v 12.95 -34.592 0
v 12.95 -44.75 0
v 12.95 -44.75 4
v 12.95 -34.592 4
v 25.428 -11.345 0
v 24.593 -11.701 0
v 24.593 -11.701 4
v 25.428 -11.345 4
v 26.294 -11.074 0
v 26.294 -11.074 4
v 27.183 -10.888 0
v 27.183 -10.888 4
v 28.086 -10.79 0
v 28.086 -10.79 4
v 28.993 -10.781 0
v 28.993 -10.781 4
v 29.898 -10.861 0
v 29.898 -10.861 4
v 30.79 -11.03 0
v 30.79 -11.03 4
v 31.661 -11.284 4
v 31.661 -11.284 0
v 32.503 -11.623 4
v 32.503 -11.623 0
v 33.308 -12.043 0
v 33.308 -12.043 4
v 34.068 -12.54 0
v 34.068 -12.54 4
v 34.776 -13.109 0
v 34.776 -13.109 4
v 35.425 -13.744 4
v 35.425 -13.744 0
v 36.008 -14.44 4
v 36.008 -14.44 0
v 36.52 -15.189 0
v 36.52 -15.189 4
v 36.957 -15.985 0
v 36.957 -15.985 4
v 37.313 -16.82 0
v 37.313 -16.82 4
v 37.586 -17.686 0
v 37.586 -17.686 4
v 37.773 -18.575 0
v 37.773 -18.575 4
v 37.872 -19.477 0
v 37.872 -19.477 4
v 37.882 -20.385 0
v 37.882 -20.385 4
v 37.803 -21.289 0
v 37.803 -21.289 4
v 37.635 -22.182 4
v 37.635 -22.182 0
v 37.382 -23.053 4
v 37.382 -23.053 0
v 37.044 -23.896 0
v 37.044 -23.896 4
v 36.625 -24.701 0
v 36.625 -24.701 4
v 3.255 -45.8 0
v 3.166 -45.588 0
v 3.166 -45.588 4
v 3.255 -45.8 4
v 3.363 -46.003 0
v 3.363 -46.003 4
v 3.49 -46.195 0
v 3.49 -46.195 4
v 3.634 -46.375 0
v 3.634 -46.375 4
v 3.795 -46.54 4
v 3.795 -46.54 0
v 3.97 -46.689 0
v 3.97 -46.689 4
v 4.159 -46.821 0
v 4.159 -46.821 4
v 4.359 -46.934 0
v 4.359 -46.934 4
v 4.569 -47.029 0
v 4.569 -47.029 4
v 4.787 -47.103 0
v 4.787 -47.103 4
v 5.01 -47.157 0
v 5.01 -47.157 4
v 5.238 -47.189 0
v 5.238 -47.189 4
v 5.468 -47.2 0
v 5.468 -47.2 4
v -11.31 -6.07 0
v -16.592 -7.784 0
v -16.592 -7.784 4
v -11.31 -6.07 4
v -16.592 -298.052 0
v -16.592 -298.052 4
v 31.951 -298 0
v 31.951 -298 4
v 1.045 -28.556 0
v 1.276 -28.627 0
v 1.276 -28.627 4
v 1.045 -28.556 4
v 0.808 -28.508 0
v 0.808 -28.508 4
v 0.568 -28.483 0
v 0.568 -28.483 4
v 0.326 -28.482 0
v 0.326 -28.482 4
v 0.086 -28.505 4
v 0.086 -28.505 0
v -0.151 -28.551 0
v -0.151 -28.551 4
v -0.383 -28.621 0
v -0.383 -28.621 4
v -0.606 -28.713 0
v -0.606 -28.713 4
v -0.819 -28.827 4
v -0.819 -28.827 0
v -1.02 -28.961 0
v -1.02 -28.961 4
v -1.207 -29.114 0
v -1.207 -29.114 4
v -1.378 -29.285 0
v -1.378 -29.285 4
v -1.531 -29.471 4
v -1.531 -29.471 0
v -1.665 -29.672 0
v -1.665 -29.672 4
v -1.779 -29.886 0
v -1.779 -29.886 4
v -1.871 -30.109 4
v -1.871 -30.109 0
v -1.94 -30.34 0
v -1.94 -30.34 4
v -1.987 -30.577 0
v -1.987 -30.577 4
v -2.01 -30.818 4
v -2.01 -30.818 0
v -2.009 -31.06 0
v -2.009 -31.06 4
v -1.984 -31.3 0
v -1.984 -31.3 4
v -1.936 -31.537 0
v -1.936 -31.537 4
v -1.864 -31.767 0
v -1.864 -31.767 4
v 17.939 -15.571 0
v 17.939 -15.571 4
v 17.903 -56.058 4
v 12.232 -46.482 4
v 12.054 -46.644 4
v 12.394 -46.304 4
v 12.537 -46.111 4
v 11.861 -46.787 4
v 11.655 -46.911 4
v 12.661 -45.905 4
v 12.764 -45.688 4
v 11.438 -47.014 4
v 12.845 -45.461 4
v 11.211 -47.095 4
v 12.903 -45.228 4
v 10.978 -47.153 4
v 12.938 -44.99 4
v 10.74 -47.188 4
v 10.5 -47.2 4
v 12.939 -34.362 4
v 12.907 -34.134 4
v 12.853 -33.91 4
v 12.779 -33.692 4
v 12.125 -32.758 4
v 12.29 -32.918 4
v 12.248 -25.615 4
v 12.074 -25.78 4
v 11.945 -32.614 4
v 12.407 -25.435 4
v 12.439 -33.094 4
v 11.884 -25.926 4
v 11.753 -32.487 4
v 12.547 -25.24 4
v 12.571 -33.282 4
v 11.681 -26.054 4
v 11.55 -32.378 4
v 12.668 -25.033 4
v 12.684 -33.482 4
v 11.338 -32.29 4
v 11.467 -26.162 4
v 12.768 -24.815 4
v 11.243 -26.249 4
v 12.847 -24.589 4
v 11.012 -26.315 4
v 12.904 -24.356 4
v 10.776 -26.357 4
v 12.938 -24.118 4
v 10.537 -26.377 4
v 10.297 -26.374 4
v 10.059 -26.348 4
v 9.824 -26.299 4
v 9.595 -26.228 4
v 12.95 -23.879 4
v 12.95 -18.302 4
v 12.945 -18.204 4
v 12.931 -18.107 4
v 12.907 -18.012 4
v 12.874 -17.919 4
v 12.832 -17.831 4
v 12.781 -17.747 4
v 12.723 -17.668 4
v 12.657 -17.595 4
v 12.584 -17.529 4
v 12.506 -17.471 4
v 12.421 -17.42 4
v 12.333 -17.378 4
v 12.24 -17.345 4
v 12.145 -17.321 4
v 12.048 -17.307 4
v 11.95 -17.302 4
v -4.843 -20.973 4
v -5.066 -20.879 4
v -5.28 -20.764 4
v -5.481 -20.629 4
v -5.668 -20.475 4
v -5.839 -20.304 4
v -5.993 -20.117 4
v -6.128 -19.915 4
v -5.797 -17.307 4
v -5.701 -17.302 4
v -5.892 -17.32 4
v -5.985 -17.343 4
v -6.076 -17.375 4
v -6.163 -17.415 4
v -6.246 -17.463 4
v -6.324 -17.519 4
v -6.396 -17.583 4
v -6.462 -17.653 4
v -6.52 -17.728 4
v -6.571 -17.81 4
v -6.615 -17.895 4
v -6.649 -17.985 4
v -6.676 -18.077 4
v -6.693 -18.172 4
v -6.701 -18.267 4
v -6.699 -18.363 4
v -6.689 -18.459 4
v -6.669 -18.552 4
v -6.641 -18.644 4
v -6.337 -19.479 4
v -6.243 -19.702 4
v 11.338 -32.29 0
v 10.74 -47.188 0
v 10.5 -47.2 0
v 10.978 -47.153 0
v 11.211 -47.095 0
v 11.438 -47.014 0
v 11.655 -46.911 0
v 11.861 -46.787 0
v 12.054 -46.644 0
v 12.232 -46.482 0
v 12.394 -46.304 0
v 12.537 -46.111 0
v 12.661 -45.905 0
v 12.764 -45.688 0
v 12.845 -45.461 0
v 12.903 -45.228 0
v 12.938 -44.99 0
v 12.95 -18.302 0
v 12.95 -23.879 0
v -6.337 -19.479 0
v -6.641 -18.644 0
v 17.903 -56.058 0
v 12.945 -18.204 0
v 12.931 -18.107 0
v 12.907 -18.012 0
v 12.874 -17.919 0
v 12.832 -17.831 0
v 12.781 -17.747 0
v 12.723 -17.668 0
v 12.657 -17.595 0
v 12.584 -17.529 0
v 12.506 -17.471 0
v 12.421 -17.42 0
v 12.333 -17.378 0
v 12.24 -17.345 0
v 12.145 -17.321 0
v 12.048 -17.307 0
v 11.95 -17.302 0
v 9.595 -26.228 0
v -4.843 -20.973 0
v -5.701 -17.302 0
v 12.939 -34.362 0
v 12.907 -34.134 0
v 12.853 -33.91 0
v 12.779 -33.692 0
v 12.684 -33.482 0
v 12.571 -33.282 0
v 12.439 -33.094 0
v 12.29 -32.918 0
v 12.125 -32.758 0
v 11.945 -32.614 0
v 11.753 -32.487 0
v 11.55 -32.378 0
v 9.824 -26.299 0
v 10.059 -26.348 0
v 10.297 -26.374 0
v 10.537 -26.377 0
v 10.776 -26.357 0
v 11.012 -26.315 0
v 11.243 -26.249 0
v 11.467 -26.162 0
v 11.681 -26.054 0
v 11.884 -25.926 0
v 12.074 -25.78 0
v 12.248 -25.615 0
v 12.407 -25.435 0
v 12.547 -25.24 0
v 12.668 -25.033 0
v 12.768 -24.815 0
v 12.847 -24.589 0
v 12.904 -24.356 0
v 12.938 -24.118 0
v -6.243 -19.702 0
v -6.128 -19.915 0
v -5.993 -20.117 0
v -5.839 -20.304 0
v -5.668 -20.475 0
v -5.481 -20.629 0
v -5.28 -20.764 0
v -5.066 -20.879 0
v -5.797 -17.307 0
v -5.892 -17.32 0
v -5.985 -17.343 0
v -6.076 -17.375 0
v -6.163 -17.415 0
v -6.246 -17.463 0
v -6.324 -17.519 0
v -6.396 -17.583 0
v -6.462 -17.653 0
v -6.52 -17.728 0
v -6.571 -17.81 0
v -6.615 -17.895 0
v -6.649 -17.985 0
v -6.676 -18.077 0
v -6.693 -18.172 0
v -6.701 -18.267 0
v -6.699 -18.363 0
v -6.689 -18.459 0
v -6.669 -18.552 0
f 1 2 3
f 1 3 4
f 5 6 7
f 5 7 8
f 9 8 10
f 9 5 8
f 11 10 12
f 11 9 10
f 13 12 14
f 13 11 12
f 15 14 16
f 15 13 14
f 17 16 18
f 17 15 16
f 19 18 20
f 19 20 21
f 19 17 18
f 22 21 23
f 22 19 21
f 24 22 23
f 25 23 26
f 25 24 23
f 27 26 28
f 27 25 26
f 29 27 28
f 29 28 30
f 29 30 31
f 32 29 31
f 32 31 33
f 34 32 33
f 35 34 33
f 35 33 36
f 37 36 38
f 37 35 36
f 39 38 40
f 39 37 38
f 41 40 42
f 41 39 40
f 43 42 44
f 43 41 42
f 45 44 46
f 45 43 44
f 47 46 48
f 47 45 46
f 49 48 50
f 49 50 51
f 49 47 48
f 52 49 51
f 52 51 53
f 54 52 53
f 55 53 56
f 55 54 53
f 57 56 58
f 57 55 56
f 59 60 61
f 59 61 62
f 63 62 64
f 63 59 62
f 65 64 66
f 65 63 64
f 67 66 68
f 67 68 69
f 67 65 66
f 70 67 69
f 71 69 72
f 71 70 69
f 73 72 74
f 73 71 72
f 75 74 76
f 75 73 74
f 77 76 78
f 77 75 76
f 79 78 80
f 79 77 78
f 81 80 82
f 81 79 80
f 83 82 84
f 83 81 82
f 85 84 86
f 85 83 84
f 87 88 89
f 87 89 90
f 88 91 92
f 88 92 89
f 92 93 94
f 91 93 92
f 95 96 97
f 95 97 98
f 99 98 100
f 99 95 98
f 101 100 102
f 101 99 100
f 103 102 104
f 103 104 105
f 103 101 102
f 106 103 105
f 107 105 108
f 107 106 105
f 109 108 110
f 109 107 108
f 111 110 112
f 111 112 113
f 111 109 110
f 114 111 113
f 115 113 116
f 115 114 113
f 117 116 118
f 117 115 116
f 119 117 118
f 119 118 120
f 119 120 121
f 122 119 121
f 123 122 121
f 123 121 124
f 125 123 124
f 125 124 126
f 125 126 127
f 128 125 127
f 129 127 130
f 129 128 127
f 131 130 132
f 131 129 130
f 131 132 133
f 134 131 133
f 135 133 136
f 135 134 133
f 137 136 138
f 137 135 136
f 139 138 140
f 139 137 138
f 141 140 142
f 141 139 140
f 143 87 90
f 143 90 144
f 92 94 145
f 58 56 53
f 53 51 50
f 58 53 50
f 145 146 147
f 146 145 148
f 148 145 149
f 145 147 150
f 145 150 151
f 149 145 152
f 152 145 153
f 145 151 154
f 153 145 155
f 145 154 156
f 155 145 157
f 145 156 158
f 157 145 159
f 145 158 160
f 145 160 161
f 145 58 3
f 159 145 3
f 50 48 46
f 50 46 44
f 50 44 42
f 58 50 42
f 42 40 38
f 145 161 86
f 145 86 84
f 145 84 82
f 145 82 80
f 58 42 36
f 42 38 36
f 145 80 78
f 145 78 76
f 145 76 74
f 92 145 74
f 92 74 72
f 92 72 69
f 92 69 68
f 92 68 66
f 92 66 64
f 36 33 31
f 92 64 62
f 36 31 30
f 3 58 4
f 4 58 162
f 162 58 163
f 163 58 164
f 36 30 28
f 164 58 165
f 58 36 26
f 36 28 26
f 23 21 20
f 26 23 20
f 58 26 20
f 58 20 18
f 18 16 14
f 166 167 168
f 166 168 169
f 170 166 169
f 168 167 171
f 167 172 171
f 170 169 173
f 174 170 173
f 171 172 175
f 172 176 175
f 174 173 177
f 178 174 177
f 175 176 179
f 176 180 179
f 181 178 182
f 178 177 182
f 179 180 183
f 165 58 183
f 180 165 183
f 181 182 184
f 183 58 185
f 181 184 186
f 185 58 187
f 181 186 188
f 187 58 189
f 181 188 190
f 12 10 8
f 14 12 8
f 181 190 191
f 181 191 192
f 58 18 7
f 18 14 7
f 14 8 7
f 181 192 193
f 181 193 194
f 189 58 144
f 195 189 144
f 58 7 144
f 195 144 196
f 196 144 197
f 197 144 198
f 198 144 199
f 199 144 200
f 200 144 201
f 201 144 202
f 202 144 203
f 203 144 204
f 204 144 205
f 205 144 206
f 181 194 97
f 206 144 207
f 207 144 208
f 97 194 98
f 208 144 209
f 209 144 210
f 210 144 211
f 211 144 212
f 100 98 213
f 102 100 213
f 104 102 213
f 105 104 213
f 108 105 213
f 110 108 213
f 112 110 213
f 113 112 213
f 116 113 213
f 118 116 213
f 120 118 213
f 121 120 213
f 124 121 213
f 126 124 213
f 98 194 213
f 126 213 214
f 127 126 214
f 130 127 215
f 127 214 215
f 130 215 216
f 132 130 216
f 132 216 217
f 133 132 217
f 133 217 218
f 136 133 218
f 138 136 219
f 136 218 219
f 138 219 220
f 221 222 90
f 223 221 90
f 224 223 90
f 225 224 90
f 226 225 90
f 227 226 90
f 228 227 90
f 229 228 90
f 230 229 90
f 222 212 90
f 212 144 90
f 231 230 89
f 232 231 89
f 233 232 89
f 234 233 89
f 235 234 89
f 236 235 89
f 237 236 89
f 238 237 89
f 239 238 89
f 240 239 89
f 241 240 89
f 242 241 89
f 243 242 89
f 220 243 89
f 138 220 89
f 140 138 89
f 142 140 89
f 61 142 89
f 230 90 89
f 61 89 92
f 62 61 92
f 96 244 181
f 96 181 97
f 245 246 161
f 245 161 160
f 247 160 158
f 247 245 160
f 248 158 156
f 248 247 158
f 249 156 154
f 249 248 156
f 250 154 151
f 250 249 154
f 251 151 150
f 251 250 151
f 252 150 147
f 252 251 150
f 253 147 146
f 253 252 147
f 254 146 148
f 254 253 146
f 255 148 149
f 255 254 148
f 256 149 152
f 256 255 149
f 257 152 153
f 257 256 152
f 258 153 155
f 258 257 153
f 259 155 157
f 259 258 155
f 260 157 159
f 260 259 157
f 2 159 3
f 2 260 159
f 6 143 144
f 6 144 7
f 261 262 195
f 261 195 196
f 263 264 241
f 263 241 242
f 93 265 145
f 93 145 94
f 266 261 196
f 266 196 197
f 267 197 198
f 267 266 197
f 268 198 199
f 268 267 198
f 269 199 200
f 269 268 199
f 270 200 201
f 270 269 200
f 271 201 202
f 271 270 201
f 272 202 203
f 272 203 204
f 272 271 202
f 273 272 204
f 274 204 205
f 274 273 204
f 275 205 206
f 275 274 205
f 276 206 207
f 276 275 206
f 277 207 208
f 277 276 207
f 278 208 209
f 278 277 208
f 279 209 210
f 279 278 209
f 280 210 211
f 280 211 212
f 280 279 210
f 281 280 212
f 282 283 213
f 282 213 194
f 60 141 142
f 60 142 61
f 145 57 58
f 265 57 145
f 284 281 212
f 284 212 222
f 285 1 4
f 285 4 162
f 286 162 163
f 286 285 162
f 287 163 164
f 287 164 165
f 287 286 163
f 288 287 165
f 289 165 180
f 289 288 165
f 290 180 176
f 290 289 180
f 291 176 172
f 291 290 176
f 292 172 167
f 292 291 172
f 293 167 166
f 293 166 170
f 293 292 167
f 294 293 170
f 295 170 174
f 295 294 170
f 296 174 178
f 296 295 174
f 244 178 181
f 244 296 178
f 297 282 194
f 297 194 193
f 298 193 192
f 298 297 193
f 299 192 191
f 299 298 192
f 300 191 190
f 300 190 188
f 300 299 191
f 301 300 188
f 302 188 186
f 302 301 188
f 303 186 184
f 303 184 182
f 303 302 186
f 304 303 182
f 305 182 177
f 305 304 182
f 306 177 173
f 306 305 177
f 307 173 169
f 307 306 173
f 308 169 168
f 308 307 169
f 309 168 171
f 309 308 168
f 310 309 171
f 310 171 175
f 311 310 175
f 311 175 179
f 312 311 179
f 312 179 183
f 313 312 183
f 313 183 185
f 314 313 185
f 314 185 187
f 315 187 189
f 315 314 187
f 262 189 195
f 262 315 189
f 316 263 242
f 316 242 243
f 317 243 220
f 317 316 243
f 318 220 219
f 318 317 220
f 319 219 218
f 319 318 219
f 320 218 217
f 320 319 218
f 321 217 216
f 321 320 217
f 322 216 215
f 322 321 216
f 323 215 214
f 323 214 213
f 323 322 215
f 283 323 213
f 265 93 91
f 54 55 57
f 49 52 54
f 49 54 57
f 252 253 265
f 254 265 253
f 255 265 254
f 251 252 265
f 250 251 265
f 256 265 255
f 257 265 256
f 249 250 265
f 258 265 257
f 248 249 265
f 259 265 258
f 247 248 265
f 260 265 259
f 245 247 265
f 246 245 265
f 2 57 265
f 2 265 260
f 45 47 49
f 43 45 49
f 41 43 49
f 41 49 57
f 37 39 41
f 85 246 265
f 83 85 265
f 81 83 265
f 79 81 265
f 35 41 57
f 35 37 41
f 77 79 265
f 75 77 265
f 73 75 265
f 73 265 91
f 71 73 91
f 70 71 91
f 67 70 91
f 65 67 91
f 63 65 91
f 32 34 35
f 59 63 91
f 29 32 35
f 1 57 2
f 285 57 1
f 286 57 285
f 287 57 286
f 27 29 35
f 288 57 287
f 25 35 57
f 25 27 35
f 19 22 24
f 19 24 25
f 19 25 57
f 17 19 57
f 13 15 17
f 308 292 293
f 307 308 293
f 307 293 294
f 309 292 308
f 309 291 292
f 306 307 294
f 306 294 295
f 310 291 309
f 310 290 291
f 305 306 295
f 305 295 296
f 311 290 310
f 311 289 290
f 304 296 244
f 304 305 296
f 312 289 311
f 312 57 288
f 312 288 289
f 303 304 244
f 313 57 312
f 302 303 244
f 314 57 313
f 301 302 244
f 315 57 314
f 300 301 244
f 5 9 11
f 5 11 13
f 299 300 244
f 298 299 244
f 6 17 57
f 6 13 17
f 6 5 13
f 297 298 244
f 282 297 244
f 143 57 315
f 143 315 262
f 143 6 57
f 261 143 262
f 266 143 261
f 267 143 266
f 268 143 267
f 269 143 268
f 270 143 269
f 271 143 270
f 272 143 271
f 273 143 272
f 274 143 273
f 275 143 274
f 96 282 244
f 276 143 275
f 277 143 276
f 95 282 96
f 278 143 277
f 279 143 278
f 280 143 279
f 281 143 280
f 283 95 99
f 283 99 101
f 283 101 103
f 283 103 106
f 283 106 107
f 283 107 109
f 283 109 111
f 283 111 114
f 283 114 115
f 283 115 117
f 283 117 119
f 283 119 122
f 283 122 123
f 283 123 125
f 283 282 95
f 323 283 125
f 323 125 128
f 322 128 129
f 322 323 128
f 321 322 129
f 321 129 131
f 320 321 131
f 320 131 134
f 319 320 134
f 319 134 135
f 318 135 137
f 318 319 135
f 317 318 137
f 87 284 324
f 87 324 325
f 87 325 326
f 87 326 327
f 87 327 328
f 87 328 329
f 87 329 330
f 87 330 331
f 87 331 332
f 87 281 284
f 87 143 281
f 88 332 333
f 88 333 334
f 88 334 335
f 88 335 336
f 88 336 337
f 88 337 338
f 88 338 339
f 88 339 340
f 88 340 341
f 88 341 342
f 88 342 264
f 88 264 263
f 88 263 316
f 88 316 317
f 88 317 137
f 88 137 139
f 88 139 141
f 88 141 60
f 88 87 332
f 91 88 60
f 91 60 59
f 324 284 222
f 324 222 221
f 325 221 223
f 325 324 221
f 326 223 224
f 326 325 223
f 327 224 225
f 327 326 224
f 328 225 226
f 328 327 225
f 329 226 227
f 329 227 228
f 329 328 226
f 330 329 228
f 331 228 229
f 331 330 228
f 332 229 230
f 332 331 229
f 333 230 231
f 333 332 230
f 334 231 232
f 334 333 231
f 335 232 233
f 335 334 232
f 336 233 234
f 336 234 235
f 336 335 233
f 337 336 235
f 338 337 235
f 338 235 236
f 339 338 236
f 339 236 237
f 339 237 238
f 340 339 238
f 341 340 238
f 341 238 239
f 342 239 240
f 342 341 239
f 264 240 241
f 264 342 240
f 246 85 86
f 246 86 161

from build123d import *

# Parameters (mm, degrees)
BOSS_EXTRUDE6_DEPTH = 4


with BuildPart() as part:
    # Sketch20 → Boss-Extrude6 (new body)
    with BuildSketch(Plane.XY):
        with BuildLine():
            Line((36.624785701, -24.701414589), (17.902939914, -56.058435219))
            Line((17.902939914, -56.058435219), (31.951161852, -297.999999834))
            Line((31.951161852, -297.999999834), (-16.59209867, -298.052484048))
            Line((-16.59209867, -298.052484048), (-16.59209867, -7.784403475))
            Line((-16.59209867, -7.784403475), (-11.309666824, -6.069762931))
            Line((-11.309666824, -6.069762931), (17.938518552, -15.571491158))
            Line((17.938518552, -15.571491158), (24.592593053, -11.700714256))
            ThreePointArc((24.592593053, -11.700714256), (35.424716451, -13.743814885), (36.624785701, -24.701414589))
        make_face()
        with BuildLine():
            Line((-6.6408348, -18.644095931), (-6.337063012, -19.478702059))
            ThreePointArc((-6.337063012, -19.478702059), (-5.755598413, -20.391418654), (-4.842881819, -20.972883253))
            Line((-4.842881819, -20.972883253), (9.594949642, -26.227824152))
            ThreePointArc((9.594949642, -26.227824152), (11.883941091, -25.92647271), (12.95, -23.8785926))
            Line((12.95, -23.8785926), (12.95, -18.302075788))
            ThreePointArc((12.95, -18.302075788), (12.657106781, -17.594969007), (11.95, -17.302075788))
            Line((11.95, -17.302075788), (-5.701142179, -17.302075788))
            ThreePointArc((-5.701142179, -17.302075788), (-6.520294224, -17.728499352), (-6.6408348, -18.644095931))
        make_face(mode=Mode.SUBTRACT)
        with BuildLine():
            Line((-1.8643328, -31.767427321), (3.165925841, -45.587949351))
            ThreePointArc((3.165925841, -45.587949351), (4.062910493, -46.756922509), (5.468172762, -47.2))
            Line((5.468172762, -47.2), (10.5, -47.2))
            ThreePointArc((10.5, -47.2), (12.232411614, -46.482411614), (12.95, -44.75))
            Line((12.95, -44.75), (12.95, -34.591777725))
            ThreePointArc((12.95, -34.591777725), (12.506922509, -33.186515456), (11.337949351, -32.289530804))
            Line((11.337949351, -32.289530804), (1.275863472, -28.627231049))
            ThreePointArc((1.275863472, -28.627231049), (-1.294497493, -29.197066356), (-1.8643328, -31.767427321))
        make_face(mode=Mode.SUBTRACT)
    extrude(amount=BOSS_EXTRUDE6_DEPTH)


solid = part.part
